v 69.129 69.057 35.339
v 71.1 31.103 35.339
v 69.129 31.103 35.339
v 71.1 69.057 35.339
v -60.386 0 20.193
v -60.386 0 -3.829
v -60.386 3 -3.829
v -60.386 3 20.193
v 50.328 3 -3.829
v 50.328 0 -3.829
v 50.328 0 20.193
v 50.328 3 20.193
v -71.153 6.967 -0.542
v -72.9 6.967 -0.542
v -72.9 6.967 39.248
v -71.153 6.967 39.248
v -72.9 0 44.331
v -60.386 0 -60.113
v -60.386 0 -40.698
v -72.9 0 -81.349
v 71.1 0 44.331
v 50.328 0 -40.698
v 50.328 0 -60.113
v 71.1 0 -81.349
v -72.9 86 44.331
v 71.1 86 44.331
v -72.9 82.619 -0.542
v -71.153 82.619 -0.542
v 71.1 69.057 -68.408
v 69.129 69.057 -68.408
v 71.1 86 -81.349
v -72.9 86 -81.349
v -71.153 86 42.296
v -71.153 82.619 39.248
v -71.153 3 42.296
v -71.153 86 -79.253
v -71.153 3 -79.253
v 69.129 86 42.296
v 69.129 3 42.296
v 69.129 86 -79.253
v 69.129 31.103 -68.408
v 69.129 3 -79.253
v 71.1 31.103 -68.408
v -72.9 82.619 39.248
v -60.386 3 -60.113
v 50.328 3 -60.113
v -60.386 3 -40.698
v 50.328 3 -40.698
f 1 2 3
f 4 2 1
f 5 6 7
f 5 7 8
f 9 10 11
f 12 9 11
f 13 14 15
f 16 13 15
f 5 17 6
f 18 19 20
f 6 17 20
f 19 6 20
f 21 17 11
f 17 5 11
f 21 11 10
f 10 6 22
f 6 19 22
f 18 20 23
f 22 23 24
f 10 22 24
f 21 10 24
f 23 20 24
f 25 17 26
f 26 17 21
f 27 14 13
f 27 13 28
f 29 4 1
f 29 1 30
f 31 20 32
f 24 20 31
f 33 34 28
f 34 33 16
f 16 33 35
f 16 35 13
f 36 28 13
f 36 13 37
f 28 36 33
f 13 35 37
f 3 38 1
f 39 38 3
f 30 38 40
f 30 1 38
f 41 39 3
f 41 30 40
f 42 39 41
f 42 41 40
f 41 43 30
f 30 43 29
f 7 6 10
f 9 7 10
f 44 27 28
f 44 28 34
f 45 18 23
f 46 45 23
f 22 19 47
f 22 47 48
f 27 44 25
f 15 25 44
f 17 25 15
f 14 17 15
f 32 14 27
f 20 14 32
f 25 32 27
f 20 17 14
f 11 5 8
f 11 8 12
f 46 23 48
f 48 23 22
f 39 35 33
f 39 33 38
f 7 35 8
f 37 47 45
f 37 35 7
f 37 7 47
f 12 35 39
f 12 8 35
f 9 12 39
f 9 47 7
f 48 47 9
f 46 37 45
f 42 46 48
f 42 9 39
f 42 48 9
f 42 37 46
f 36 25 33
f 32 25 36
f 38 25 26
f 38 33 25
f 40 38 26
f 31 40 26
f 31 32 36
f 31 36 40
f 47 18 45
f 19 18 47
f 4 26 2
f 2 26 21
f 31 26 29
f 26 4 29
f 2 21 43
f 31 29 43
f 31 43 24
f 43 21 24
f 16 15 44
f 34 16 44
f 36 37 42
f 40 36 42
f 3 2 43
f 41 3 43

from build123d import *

# Parameters (mm, degrees)
SKETCH1_W           = 144
SKETCH1_H           = 125.68
BOSS_EXTRUDE1_DEPTH = 3
SKETCH2_W           = 144
SKETCH2_H           = 125.68
SKETCH2_W_2         = 140.282516161
SKETCH2_H_2         = 121.548177757
BOSS_EXTRUDE2_DEPTH = 83
SKETCH4_W           = 103.746737409
SKETCH4_H           = 37.953937335
CUT_EXTRUDE1_DEPTH  = 20
SKETCH5_W           = 110.713821745
SKETCH5_H           = 19.414835186
SKETCH5_H_2         = 24.021424071
CUT_EXTRUDE2_DEPTH  = 20
SKETCH6_W           = 39.790164022
SKETCH6_H           = 75.651590962
CUT_EXTRUDE3_DEPTH  = 20


with BuildPart() as part:
    # Sketch1 → Boss-Extrude1 (new body)
    with BuildSketch(Plane(origin=(0, 0, 0), x_dir=(1, 0, 0), z_dir=(0, 1, 0))):
        with Locations((-0.900426333, 18.508659662)):
            Rectangle(SKETCH1_W, SKETCH1_H)
    extrude(amount=BOSS_EXTRUDE1_DEPTH)

    # Sketch2 → Boss-Extrude2 (add)
    with BuildSketch(Plane(origin=(0, 3, 0), x_dir=(1, 0, 0), z_dir=(0, 1, 0))):
        with Locations((-0.900426333, 18.508659662)):
            Rectangle(SKETCH2_W, SKETCH2_H)
        with Locations((-1.012042147, 18.478566742)):
            Rectangle(SKETCH2_W_2, SKETCH2_H_2, mode=Mode.SUBTRACT)
    extrude(amount=BOSS_EXTRUDE2_DEPTH)

    # Sketch4 → Cut-Extrude1 (cut)
    with BuildSketch(Plane(origin=(71.099573667, 0, 0), x_dir=(0, 0, -1), z_dir=(1, 0, 0))):
        with Locations((16.534795252, 50.079604952)):
            Rectangle(SKETCH4_W, SKETCH4_H)
    extrude(amount=-CUT_EXTRUDE1_DEPTH, mode=Mode.SUBTRACT)

    # Sketch5 → Cut-Extrude2 (cut)
    with BuildSketch(Plane.XZ):
        with Locations((-5.028686967, -50.405830616)):
            Rectangle(SKETCH5_W, SKETCH5_H)
        with Locations((-5.028686967, 8.182044553)):
            Rectangle(SKETCH5_W, SKETCH5_H_2)
    extrude(amount=-CUT_EXTRUDE2_DEPTH, mode=Mode.SUBTRACT)

    # Sketch6 → Cut-Extrude3 (cut)
    with BuildSketch(Plane.ZY.offset(72.900426333)):
        with Locations((19.353212204, 44.793227562)):
            Rectangle(SKETCH6_W, SKETCH6_H)
    extrude(amount=-CUT_EXTRUDE3_DEPTH, mode=Mode.SUBTRACT)


solid = part.part
